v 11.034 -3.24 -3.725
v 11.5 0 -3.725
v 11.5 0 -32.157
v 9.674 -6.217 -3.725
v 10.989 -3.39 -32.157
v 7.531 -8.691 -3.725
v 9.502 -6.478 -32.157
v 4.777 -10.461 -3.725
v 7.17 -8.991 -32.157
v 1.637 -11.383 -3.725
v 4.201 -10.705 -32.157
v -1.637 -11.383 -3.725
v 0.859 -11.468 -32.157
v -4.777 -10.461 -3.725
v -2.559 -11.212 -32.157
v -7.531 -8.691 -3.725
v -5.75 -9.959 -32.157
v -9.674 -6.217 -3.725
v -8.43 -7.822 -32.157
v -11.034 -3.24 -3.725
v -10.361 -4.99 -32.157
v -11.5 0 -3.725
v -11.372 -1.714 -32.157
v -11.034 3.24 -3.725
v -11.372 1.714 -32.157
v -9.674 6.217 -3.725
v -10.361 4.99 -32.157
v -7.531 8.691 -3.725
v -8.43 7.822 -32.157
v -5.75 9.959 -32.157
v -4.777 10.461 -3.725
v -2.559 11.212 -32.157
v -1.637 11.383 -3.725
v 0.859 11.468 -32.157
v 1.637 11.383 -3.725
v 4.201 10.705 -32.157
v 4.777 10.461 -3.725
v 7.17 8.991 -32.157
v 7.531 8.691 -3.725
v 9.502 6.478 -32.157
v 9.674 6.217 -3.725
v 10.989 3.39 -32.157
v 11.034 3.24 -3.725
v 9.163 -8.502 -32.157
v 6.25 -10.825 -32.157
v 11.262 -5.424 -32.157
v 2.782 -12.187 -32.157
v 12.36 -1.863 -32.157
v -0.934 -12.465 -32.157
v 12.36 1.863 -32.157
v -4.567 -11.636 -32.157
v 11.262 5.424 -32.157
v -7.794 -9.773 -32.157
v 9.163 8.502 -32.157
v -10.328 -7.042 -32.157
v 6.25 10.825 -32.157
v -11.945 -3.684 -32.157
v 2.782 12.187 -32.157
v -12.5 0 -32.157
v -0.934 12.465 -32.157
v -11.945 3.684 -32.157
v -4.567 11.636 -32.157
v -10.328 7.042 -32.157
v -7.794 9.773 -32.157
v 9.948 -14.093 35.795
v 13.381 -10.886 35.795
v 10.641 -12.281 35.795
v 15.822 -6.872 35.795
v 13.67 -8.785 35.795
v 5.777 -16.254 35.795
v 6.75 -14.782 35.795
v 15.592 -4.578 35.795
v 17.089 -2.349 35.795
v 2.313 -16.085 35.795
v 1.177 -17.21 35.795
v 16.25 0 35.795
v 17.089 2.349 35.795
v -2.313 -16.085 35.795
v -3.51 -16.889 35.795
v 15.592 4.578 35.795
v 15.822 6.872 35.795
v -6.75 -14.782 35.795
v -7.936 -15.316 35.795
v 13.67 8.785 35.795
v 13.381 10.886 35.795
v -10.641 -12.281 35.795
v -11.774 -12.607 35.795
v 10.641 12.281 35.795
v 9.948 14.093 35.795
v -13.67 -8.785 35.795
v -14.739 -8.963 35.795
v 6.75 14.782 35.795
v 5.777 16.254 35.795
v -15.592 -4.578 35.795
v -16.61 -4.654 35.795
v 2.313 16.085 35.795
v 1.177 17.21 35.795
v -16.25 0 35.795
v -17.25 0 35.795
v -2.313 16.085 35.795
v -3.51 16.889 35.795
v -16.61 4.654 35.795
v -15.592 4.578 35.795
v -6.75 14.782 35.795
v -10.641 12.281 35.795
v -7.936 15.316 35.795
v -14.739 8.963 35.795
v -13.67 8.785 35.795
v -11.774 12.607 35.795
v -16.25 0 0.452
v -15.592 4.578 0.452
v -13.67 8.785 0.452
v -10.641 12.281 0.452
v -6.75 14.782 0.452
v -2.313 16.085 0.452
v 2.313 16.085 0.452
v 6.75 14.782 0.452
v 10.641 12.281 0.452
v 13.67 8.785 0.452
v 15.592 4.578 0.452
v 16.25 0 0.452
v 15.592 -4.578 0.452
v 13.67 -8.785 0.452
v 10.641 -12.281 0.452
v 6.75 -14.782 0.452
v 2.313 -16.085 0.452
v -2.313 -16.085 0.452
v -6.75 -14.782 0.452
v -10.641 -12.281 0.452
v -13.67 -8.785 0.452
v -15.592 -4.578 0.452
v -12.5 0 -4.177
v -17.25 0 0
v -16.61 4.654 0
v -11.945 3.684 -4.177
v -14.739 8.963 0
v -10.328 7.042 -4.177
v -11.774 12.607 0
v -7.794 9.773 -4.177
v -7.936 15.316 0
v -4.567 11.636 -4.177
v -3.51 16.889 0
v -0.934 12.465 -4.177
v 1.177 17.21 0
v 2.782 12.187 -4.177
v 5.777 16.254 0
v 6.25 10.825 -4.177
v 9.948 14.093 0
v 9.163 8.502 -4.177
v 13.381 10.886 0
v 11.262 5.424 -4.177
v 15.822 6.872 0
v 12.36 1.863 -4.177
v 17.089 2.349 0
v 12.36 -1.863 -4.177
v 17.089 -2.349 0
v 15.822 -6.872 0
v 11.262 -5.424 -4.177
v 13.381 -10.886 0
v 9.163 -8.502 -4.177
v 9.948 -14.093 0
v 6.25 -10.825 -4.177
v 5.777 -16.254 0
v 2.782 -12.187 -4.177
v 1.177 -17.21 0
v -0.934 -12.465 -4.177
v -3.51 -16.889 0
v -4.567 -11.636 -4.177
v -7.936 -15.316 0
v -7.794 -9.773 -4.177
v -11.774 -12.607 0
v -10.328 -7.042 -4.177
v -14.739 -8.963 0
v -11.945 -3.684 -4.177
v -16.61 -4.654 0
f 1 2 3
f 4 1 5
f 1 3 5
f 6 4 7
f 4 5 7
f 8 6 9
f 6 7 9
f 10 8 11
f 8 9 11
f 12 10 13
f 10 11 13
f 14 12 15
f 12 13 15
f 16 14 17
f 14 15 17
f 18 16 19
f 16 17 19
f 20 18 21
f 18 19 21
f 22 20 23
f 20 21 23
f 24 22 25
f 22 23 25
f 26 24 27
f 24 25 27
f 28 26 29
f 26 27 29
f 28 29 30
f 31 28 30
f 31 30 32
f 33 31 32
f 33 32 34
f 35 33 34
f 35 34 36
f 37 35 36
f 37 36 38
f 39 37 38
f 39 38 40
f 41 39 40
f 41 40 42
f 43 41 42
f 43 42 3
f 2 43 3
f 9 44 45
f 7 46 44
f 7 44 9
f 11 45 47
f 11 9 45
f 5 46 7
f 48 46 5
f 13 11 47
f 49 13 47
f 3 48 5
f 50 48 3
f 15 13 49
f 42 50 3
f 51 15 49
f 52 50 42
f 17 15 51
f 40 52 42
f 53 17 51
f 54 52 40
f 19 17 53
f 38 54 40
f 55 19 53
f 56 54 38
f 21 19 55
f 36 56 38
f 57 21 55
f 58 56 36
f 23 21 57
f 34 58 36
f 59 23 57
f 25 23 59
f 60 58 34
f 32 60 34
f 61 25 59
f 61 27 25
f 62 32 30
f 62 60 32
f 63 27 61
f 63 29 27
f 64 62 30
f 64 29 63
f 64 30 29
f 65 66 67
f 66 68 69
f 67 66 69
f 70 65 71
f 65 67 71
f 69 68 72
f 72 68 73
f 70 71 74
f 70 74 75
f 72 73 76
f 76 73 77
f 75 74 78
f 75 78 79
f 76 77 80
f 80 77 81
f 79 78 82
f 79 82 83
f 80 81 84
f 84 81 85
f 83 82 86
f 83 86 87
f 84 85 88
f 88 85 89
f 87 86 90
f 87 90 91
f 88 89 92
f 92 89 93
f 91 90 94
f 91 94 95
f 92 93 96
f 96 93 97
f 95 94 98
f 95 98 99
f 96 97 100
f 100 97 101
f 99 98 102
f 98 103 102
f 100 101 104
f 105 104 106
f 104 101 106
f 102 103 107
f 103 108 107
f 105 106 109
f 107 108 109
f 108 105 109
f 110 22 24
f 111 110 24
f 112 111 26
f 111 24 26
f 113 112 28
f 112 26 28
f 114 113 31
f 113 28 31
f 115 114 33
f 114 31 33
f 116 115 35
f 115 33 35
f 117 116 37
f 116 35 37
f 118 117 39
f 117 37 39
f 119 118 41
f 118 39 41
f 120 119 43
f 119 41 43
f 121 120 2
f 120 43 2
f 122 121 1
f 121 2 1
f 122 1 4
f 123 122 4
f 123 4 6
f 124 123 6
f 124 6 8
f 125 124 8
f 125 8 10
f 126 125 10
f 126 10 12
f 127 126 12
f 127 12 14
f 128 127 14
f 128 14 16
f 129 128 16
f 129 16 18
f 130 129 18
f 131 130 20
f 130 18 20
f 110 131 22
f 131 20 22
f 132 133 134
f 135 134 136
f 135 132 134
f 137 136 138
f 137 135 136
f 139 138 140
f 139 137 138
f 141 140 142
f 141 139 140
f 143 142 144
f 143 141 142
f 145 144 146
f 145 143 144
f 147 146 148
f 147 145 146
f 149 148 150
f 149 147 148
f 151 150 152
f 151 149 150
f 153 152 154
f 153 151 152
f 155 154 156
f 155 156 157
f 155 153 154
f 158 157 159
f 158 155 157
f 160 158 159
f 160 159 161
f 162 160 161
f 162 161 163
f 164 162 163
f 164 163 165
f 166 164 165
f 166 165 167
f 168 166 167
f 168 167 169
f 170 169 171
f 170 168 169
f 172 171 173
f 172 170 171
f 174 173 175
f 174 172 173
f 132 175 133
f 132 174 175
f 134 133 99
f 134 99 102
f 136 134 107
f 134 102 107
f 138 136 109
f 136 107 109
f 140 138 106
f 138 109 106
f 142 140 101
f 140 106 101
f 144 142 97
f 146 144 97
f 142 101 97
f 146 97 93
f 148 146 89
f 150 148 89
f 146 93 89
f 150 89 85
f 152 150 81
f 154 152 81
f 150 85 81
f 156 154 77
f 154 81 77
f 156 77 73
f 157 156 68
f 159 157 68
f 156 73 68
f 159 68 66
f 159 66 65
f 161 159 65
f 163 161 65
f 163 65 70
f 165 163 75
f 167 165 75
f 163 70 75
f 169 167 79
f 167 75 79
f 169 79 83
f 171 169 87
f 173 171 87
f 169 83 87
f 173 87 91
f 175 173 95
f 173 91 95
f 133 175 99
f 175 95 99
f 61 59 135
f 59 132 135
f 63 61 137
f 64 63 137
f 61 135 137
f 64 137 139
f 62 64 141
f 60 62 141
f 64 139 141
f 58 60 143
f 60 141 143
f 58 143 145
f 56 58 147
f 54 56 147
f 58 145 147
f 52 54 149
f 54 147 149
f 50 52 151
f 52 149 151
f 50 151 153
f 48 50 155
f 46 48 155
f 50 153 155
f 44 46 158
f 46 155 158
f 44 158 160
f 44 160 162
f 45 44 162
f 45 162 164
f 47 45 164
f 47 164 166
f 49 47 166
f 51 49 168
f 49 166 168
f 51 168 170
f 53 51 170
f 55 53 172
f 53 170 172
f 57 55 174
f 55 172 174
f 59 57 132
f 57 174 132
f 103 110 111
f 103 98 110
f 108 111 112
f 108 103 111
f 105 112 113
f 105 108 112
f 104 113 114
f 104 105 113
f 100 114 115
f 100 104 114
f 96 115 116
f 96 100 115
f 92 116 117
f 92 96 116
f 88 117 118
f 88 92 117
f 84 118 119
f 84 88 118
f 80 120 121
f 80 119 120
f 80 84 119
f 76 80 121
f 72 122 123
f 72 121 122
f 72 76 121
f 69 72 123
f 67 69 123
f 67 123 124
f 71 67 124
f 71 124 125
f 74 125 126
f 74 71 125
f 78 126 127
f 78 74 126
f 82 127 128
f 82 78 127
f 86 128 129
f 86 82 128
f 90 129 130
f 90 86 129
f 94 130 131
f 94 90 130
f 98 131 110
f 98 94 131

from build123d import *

# Parameters (mm, degrees)
F0_W     = 17.25
F0_H     = 35.7945342632
F0_W_2   = 12.5
F0_H_2   = 27.9797699204
F3_T     = -1
F2_R     = 11.5
F4_DEPTH = 40


with BuildPart() as f1:
    # F0 (on Front) → F1 (revolve)
    with BuildSketch(Plane.XZ):
        with Locations((-8.625, 17.8972671316)):
            Rectangle(F0_W, F0_H)
        Polygon((0, -4.1769962882), (0, 0), (-17.25, 0), (-12.5, -4.1769962882), align=None)
        with Locations((-6.25, -18.1668812483)):
            Rectangle(F0_W_2, F0_H_2)
    revolve(axis=Axis((0, 0, 1.8188840273), (0, 0, -1)))

    # F3
    f3_openings = [f1.faces().sort_by_distance(p)[0] for p in [
        (0, 0, 35.794534),
    ]]
    offset(amount=F3_T, openings=f3_openings, kind=Kind.INTERSECTION)

    # F2 (on face) → F4 (cut)
    with BuildSketch(Plane(origin=(0, 0, -32.1567662085), x_dir=(1, 0, 0), z_dir=(0, 0, -1))):
        Circle(F2_R)
    extrude(amount=-F4_DEPTH, mode=Mode.SUBTRACT)


solid = f1.part
